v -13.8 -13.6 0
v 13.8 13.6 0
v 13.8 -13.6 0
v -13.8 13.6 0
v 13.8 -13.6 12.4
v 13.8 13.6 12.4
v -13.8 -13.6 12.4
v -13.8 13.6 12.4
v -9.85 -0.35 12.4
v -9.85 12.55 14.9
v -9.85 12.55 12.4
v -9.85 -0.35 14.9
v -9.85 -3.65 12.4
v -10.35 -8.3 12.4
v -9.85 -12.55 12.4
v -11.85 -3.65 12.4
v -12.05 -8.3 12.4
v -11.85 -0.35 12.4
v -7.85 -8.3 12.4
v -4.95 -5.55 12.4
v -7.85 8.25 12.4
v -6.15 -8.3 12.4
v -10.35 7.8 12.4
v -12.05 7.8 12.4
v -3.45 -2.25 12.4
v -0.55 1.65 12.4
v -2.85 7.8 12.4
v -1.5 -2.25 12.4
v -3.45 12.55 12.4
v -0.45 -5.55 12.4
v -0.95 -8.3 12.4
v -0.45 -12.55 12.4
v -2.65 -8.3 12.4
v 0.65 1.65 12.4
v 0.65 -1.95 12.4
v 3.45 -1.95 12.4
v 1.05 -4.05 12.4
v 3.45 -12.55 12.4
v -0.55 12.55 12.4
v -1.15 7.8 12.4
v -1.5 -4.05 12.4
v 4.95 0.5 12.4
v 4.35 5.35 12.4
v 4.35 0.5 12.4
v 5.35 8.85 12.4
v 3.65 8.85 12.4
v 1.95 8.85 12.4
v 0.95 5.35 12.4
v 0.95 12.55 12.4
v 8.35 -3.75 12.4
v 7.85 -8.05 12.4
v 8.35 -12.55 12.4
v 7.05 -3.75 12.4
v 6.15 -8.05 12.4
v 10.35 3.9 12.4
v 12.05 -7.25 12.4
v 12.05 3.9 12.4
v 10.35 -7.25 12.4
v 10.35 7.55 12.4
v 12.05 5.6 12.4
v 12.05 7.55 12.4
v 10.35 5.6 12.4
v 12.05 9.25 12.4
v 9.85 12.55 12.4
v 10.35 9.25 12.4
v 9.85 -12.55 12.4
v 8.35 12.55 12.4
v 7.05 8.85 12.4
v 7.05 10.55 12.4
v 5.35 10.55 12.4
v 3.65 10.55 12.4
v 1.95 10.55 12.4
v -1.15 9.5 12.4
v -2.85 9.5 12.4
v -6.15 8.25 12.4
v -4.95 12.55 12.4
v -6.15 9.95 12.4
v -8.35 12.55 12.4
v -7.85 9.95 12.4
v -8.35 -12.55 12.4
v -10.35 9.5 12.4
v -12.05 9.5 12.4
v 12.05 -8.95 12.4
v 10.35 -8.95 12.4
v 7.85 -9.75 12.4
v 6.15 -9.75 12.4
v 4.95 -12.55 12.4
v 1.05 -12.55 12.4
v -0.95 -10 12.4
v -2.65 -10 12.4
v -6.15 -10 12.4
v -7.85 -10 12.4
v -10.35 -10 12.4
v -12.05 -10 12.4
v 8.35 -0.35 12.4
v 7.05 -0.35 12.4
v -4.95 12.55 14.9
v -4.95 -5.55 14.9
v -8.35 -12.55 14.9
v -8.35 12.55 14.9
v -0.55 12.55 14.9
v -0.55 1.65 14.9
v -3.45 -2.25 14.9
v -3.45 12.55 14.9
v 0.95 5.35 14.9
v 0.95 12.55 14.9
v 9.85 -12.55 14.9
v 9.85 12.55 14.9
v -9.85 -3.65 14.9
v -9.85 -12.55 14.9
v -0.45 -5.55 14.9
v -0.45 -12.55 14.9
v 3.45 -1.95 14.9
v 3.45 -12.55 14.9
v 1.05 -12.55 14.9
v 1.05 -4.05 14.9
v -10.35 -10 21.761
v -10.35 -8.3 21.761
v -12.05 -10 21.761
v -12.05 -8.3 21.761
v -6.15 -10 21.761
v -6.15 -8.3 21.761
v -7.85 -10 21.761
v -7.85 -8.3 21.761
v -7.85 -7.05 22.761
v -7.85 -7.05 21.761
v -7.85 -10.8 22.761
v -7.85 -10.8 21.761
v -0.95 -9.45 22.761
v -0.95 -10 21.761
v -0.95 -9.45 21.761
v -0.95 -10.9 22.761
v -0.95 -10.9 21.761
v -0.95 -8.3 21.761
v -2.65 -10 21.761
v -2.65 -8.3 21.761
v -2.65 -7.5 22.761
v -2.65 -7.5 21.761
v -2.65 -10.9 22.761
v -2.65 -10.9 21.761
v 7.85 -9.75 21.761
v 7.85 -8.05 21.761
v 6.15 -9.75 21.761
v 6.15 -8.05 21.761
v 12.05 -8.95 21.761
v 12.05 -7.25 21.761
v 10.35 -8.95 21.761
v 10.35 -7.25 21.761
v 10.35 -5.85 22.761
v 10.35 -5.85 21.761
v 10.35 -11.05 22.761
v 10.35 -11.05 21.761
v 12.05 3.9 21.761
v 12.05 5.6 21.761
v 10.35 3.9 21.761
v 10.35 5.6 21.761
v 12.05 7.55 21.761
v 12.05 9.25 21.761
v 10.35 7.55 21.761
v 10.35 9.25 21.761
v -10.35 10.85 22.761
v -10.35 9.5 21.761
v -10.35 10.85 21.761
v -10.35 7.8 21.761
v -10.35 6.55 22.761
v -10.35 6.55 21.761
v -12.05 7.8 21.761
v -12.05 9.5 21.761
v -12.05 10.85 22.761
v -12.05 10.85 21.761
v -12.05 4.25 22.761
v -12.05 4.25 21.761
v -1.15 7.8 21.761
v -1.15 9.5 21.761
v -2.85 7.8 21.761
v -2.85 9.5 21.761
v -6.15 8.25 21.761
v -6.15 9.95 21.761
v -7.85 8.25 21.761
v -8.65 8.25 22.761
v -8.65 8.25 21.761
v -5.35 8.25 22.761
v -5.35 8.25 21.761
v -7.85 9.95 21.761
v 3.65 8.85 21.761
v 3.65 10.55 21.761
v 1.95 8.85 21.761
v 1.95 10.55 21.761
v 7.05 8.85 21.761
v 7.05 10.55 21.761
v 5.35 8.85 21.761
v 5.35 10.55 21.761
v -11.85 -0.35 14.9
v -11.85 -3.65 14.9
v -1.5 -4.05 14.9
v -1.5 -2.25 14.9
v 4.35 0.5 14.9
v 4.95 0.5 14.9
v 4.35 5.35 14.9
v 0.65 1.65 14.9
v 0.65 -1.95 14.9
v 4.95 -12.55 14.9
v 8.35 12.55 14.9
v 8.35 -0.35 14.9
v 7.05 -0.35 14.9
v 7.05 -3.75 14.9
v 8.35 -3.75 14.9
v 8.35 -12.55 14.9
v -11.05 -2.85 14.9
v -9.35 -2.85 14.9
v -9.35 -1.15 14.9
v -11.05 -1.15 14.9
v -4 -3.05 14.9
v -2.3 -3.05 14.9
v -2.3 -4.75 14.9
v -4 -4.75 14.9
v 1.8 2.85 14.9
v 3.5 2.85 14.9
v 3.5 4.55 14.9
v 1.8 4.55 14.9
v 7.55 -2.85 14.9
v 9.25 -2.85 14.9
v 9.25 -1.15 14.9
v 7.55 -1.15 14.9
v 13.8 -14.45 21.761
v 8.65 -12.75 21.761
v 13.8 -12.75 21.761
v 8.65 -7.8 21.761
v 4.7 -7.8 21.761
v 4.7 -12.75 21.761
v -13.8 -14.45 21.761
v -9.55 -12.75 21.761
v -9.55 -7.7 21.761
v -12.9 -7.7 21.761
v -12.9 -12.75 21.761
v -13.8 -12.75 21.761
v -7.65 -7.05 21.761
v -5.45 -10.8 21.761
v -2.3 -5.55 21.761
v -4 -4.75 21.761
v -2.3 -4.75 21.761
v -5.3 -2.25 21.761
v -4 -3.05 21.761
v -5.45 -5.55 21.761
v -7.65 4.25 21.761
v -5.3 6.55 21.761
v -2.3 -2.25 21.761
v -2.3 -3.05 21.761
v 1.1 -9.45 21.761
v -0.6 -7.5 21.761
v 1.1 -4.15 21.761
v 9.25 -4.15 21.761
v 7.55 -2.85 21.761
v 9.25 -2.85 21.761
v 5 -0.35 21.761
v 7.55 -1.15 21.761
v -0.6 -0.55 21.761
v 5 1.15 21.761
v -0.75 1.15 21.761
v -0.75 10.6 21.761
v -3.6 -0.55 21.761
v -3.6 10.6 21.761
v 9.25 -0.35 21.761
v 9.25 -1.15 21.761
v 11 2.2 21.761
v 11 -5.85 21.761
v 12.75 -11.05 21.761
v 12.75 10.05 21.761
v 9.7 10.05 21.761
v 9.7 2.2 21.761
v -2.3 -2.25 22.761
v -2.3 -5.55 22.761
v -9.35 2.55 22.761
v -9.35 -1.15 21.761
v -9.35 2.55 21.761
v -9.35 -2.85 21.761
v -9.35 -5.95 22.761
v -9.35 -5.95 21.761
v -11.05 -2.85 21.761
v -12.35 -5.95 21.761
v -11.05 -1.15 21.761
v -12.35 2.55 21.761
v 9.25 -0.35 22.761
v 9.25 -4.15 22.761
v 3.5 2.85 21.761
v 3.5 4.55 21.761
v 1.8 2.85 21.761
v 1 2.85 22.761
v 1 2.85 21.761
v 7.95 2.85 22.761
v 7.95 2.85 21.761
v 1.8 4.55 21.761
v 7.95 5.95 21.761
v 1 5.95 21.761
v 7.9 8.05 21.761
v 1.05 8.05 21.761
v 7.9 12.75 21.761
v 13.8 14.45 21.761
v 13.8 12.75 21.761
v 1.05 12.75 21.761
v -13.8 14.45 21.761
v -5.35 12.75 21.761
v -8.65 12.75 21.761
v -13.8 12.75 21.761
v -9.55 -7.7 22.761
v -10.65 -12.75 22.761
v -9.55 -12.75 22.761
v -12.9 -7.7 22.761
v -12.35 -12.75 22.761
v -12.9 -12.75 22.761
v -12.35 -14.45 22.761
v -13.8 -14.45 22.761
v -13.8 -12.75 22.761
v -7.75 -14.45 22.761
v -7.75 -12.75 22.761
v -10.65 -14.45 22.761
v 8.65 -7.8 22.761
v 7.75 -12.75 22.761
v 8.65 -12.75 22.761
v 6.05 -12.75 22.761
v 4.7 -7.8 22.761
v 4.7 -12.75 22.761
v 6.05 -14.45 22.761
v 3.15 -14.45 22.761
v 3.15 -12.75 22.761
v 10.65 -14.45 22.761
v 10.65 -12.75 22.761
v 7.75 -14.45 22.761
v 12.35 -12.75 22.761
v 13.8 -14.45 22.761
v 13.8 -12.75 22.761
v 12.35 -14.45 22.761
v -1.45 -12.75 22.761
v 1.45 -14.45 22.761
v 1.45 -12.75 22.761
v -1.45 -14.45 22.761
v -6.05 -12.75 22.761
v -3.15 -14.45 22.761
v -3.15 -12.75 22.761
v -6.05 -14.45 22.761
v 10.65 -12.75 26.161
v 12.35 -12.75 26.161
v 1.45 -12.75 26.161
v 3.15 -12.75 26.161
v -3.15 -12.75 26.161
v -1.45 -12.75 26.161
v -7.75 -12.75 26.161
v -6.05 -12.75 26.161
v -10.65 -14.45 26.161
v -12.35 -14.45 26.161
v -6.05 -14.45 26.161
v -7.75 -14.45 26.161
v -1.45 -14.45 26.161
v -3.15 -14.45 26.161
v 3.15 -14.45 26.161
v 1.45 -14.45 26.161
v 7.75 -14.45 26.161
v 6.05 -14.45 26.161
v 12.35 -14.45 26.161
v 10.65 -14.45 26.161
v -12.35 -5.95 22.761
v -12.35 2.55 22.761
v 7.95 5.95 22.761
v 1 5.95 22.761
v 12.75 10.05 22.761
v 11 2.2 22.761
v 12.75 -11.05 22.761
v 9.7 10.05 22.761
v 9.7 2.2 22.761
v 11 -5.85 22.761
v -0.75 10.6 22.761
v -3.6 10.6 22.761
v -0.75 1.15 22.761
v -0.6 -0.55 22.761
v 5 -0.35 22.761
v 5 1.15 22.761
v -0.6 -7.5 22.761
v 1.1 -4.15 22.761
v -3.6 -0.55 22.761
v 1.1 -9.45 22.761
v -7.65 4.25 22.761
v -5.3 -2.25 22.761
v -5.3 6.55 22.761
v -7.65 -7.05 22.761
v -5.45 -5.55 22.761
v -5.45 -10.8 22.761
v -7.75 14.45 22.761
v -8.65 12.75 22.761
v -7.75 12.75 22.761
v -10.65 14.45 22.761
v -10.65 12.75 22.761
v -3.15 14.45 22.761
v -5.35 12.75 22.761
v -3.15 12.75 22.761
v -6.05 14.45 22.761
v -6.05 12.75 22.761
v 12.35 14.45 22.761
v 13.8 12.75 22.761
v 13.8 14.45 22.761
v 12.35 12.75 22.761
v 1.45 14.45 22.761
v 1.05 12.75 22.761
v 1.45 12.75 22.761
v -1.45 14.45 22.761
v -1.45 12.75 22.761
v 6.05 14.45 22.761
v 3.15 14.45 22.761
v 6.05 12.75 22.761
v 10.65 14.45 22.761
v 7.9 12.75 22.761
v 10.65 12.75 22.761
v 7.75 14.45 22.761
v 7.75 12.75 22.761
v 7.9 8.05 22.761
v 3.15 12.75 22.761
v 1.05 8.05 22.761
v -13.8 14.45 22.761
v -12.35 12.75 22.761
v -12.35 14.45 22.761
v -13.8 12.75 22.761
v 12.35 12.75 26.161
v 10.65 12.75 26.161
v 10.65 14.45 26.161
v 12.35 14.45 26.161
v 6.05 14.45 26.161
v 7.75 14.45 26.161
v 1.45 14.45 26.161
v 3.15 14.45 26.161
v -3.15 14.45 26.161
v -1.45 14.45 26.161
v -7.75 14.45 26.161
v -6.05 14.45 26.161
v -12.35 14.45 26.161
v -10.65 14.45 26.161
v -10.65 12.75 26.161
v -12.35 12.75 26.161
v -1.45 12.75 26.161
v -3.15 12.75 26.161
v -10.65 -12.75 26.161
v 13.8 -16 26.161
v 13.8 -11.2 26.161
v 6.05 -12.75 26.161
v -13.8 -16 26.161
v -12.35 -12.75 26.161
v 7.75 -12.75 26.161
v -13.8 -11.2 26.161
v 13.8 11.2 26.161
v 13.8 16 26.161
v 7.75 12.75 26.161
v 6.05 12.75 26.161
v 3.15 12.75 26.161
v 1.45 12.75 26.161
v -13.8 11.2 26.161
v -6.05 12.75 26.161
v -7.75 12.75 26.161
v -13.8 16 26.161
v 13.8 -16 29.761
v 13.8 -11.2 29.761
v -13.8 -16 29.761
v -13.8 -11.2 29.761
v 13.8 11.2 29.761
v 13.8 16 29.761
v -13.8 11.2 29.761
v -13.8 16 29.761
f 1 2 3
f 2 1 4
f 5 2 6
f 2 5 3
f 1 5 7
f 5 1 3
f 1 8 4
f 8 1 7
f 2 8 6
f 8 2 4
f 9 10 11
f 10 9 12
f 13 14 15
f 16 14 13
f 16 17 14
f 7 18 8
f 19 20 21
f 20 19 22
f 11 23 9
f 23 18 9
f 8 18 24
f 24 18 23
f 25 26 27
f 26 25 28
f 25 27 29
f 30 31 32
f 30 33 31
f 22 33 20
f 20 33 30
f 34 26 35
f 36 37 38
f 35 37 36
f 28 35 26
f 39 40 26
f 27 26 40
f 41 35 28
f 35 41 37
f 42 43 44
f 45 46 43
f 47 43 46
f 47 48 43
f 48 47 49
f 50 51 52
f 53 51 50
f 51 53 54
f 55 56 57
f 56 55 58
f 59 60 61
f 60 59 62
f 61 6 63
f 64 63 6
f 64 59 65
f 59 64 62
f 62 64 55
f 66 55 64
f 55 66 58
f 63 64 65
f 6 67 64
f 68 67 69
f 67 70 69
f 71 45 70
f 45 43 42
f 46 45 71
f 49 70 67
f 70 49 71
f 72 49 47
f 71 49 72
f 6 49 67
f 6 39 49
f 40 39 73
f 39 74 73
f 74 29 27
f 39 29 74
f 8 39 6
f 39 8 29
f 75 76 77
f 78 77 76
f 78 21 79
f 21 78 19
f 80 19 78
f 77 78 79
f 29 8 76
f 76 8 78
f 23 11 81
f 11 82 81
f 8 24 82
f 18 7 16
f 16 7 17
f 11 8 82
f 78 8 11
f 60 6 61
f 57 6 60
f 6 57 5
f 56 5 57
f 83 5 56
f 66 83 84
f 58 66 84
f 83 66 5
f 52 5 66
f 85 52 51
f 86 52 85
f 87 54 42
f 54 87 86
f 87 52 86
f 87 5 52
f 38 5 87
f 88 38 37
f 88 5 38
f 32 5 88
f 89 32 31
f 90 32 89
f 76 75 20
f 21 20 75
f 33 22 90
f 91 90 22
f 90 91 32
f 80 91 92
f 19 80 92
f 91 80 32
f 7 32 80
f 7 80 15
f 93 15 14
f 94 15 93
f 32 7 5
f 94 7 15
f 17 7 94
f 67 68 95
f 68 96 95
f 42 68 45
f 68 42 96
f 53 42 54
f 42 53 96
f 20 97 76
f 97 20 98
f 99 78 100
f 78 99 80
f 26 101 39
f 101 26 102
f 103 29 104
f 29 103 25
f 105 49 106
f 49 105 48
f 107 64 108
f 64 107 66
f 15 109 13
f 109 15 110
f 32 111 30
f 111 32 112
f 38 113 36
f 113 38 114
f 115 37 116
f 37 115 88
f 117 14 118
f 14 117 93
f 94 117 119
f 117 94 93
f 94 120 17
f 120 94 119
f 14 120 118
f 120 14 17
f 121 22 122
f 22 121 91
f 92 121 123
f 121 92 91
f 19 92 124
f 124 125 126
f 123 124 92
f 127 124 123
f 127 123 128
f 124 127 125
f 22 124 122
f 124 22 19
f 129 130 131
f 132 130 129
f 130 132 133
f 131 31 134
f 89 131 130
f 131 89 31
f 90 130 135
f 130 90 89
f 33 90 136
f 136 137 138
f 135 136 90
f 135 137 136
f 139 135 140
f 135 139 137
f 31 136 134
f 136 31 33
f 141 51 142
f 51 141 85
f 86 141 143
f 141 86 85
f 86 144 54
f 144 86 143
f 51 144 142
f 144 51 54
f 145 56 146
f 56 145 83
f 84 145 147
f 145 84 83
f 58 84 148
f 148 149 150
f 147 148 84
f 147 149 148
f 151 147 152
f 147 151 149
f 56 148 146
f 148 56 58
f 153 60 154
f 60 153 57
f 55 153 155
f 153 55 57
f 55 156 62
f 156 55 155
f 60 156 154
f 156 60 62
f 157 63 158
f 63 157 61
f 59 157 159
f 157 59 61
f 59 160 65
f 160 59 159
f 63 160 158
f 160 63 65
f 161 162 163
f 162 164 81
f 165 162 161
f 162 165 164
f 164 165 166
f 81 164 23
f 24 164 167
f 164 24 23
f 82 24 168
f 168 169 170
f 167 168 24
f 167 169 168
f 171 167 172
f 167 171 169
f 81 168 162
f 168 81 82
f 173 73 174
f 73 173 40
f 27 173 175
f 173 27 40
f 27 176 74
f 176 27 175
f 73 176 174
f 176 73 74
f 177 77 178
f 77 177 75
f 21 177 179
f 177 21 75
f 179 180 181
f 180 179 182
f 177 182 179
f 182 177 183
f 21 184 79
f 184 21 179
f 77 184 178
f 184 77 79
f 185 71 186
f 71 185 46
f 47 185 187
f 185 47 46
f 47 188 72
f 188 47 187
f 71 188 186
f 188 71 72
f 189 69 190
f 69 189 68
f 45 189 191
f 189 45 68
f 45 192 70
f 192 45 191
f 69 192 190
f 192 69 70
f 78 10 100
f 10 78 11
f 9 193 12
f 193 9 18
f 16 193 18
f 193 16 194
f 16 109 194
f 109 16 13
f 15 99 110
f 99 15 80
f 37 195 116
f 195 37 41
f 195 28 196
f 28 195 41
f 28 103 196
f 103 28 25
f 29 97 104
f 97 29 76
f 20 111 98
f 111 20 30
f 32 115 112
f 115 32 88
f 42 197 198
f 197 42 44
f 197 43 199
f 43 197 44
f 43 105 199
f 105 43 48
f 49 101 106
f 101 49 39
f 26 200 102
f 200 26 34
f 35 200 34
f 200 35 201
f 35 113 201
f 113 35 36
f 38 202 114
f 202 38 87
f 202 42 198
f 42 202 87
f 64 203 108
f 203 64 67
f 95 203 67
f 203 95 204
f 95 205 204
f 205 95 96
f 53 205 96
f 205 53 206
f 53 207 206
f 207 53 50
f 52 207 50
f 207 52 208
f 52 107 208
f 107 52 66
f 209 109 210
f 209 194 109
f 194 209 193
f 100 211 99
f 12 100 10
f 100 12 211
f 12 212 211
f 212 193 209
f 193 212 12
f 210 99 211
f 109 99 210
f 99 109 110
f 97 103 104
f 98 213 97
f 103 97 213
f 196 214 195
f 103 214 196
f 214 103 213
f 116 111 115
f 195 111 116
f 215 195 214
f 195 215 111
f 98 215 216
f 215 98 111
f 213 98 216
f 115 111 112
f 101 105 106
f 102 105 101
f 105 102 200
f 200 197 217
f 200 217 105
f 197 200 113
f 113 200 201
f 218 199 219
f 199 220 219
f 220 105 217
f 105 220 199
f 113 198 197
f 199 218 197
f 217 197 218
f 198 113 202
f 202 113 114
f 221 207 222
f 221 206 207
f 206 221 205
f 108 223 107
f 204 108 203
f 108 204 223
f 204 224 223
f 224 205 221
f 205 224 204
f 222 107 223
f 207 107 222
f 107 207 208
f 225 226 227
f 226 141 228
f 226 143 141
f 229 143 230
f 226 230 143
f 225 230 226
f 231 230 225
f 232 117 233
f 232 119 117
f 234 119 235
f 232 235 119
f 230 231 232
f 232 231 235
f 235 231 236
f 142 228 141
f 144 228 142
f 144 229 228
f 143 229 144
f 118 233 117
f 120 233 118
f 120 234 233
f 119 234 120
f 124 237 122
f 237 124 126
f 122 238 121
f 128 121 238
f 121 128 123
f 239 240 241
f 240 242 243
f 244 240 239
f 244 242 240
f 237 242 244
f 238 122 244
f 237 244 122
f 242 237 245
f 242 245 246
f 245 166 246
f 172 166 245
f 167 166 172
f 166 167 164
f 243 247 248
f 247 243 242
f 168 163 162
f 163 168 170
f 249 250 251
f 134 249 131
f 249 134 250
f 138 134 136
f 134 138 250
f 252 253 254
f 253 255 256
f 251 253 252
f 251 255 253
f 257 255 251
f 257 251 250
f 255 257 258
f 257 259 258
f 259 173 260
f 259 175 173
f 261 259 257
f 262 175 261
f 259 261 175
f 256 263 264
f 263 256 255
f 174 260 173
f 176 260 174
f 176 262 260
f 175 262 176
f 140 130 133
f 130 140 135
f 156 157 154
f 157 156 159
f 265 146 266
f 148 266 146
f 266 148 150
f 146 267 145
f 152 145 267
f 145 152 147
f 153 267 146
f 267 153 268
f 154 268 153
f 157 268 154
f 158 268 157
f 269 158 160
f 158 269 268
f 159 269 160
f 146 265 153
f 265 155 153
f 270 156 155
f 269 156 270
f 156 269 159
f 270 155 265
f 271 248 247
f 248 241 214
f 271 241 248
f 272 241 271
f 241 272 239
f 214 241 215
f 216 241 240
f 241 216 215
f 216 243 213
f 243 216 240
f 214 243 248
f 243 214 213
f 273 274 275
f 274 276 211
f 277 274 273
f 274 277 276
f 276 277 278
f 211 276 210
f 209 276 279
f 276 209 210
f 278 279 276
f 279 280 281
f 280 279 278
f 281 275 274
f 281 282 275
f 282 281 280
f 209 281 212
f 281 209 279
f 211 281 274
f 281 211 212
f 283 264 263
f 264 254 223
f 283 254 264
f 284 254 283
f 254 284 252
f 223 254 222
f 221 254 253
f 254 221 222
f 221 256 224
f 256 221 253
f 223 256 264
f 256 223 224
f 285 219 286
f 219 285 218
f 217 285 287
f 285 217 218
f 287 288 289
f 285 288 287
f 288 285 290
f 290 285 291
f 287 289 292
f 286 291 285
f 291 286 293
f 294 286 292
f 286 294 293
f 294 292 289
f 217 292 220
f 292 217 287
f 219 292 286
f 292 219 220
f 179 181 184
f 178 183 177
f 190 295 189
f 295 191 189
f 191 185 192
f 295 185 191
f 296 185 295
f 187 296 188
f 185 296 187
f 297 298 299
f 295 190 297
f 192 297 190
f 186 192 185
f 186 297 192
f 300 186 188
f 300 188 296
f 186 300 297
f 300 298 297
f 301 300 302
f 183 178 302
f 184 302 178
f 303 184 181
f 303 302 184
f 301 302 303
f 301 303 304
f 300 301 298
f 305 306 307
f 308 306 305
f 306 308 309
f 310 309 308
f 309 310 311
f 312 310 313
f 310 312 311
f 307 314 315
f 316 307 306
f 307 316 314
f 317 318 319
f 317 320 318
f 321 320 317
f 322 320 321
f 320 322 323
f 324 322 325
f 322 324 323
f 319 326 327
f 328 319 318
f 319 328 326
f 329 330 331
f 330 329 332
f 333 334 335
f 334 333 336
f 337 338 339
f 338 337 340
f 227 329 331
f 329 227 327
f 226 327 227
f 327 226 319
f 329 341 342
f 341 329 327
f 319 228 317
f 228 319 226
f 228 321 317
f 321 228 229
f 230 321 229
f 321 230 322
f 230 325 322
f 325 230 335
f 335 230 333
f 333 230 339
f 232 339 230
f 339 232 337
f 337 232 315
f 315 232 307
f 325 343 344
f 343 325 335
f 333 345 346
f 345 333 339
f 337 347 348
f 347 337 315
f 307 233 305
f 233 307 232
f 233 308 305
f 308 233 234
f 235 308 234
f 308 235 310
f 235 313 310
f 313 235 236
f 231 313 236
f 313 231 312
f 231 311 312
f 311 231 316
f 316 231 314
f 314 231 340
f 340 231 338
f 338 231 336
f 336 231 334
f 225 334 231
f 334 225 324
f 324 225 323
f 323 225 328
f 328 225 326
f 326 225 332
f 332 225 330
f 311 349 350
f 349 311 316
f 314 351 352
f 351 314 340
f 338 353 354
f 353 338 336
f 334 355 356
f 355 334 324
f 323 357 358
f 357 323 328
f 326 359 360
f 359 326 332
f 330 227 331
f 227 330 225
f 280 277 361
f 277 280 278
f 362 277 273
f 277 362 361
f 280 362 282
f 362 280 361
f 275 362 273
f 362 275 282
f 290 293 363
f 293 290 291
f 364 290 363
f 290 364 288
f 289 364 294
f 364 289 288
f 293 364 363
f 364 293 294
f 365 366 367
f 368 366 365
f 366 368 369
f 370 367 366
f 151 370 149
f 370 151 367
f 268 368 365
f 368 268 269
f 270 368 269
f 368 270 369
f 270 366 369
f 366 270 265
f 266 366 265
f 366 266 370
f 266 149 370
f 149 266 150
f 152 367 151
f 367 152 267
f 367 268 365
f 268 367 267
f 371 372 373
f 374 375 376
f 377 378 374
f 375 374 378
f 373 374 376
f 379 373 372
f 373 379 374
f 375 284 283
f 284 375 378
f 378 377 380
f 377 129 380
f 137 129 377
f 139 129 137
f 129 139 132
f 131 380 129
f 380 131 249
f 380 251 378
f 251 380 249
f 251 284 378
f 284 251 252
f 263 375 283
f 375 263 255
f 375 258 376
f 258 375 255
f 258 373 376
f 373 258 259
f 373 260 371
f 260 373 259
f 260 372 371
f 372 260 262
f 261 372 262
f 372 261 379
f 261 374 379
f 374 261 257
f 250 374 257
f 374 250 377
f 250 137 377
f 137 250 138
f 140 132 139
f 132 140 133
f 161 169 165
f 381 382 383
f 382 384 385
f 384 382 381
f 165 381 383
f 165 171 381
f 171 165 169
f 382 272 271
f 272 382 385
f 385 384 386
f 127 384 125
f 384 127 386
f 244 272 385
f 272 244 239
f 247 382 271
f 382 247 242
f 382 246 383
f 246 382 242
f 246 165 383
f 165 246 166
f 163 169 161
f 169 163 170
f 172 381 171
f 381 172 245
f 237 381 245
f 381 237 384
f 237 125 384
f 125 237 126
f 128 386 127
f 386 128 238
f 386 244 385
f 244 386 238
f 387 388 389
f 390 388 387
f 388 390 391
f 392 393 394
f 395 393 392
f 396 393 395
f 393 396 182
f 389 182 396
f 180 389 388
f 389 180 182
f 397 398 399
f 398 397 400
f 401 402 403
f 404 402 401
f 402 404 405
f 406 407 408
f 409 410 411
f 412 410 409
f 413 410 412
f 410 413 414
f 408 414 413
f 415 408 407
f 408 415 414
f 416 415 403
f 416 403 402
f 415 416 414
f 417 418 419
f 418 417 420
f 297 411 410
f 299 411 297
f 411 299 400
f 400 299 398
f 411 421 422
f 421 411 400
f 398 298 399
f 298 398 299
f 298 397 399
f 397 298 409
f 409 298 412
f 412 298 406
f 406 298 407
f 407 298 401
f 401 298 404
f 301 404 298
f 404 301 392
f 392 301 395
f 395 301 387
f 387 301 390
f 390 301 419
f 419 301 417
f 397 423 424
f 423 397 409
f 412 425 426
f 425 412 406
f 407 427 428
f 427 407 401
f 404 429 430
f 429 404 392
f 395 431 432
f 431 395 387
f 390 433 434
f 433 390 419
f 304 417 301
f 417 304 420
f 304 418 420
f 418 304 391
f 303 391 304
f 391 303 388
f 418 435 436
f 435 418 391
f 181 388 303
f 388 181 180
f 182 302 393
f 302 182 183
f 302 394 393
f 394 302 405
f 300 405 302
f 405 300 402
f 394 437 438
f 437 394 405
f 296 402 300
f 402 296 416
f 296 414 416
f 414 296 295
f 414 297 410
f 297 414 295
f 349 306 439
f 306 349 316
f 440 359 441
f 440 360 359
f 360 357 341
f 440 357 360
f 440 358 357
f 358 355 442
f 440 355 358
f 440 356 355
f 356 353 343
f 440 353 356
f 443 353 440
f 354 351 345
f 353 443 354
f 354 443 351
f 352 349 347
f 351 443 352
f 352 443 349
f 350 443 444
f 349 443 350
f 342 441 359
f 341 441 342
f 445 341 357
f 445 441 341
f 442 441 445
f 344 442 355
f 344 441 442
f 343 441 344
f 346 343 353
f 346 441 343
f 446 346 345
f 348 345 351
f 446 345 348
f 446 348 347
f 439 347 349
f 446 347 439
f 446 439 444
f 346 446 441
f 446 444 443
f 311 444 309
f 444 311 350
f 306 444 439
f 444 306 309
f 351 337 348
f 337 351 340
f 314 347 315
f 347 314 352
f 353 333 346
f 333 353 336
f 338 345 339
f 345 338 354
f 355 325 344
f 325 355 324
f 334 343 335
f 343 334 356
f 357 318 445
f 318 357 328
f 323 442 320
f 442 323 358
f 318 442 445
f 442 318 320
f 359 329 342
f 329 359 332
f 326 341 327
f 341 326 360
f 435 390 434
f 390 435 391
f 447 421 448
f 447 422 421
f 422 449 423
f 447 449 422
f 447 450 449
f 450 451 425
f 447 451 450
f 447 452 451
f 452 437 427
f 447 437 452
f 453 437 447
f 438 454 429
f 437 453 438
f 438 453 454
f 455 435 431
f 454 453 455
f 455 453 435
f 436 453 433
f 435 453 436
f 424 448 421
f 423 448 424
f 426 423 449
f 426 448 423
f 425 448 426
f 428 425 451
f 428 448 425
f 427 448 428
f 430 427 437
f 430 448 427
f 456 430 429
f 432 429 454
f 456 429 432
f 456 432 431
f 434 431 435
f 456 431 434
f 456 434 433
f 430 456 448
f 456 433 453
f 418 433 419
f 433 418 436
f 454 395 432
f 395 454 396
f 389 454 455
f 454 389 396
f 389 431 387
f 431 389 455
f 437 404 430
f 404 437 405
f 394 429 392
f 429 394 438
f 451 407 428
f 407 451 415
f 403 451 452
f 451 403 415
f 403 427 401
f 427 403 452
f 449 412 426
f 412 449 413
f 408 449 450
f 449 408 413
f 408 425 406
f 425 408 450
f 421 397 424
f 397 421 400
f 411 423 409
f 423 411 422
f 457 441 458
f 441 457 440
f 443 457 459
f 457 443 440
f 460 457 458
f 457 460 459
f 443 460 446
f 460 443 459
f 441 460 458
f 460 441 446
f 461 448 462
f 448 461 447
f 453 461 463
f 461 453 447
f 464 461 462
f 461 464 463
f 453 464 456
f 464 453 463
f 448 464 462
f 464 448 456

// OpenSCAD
// Generated by SolidPython 0.4.2 on 2020-09-29 23:20:03
//!OpenSCAD

scale(v = 0.0100000000) {
	translate(v = [-1380, -1360, 0]) {
		union() {
			color(c = [0.4000000000, 0.4000000000, 0.4000000000]) {
				translate(v = [0, 0, 0]) {
					linear_extrude(height = 1000.0000000000) {
						polygon(paths = [[0, 1, 2, 3]], points = [[0, 0], [0, 2720], [2760, 2720], [2760, 0]]);
					}
				}
			}
			color(c = [0.2000000000, 0.6000000000, 0.2000000000]) {
				translate(v = [0, 0, 1000.0000000000]) {
					linear_extrude(height = 120.0000000000) {
						polygon(paths = [[0, 1, 2, 3]], points = [[0, 1305], [0, 2720], [2760, 2720], [2760, 1305]]);
					}
				}
			}
			color(c = [0.4000000000, 0.4000000000, 0.4000000000]) {
				translate(v = [0, 0, 1000.0000000000]) {
					linear_extrude(height = 120.0000000000) {
						polygon(paths = [[0, 1, 2, 3]], points = [[0, 0], [0, 1305], [2760, 1305], [2760, 0]]);
					}
				}
			}
			color(c = [0.9000000000, 0.6000000000, 0.6000000000]) {
				translate(v = [0, 0, 1120.0000000000]) {
					linear_extrude(height = 120.0000000000) {
						polygon(paths = [[0, 1, 2, 3]], points = [[135, 2065], [135, 2485], [395, 2485], [395, 2065]]);
					}
				}
			}
			color(c = [0.9000000000, 0.6000000000, 0.6000000000]) {
				translate(v = [0, 0, 1120.0000000000]) {
					linear_extrude(height = 120.0000000000) {
						polygon(paths = [[0, 1, 2, 3]], points = [[545, 2065], [545, 2485], [885, 2485], [885, 2065]]);
					}
				}
			}
			color(c = [0.9000000000, 0.6000000000, 0.6000000000]) {
				translate(v = [0, 0, 1120.0000000000]) {
					linear_extrude(height = 120.0000000000) {
						polygon(paths = [[0, 1, 2, 3]], points = [[1035, 2065], [1035, 2485], [1325, 2485], [1325, 2065]]);
					}
				}
			}
			color(c = [0.9000000000, 0.6000000000, 0.6000000000]) {
				translate(v = [0, 0, 1120.0000000000]) {
					linear_extrude(height = 120.0000000000) {
						polygon(paths = [[0, 1, 2, 3, 4, 5]], points = [[1965, 1485], [1965, 2065], [1475, 2065], [1475, 2485], [2215, 2485], [2215, 1485]]);
					}
				}
			}
			color(c = [0.9000000000, 0.6000000000, 0.6000000000]) {
				translate(v = [0, 0, 1120.0000000000]) {
					linear_extrude(height = 120.0000000000) {
						polygon(paths = [[0, 1, 2, 3]], points = [[2365, 1485], [2365, 2485], [2625, 2485], [2625, 1485]]);
					}
				}
			}
			color(c = [0.9000000000, 0.6000000000, 0.9000000000]) {
				translate(v = [0, 0, 1120.0000000000]) {
					linear_extrude(height = 120.0000000000) {
						polygon(paths = [[0, 1, 2, 3]], points = [[135, 235], [135, 655], [395, 655], [395, 235]]);
					}
				}
			}
			color(c = [0.9000000000, 0.6000000000, 0.9000000000]) {
				translate(v = [0, 0, 1120.0000000000]) {
					linear_extrude(height = 120.0000000000) {
						polygon(paths = [[0, 1, 2, 3]], points = [[545, 235], [545, 655], [805, 655], [805, 235]]);
					}
				}
			}
			color(c = [0.9000000000, 0.6000000000, 0.9000000000]) {
				translate(v = [0, 0, 1120.0000000000]) {
					linear_extrude(height = 120.0000000000) {
						polygon(paths = [[0, 1, 2, 3]], points = [[1075, 235], [1075, 655], [1335, 655], [1335, 235]]);
					}
				}
			}
			color(c = [0.9000000000, 0.6000000000, 0.9000000000]) {
				translate(v = [0, 0, 1120.0000000000]) {
					linear_extrude(height = 120.0000000000) {
						polygon(paths = [[0, 1, 2, 3]], points = [[1485, 235], [1485, 655], [1725, 655], [1725, 235]]);
					}
				}
			}
			color(c = [0.9000000000, 0.6000000000, 0.9000000000]) {
				translate(v = [0, 0, 1120.0000000000]) {
					linear_extrude(height = 120.0000000000) {
						polygon(paths = [[0, 1, 2, 3, 4, 5]], points = [[1875, 235], [1875, 655], [1955, 655], [1955, 885], [2215, 885], [2215, 235]]);
					}
				}
			}
			color(c = [0.9000000000, 0.6000000000, 0.9000000000]) {
				translate(v = [0, 0, 1120.0000000000]) {
					linear_extrude(height = 120.0000000000) {
						polygon(paths = [[0, 1, 2, 3]], points = [[2365, 235], [2365, 885], [2625, 885], [2625, 235]]);
					}
				}
			}
			color(c = [0.2000000000, 0.6000000000, 0.2000000000]) {
				translate(v = [0, 0, 1120.0000000000]) {
					linear_extrude(height = 120.0000000000) {
						difference() {
							polygon(paths = [[0, 1, 2, 3]], points = [[0, 1305], [0, 2720], [2760, 2720], [2760, 1305]]);
							polygon(paths = [[0, 1, 2, 3]], points = [[2365, 1485], [2625, 1485], [2625, 2485], [2365, 2485]]);
							polygon(paths = [[0, 1, 2, 3]], points = [[135, 2065], [395, 2065], [395, 2485], [135, 2485]]);
							polygon(paths = [[0, 1, 2, 3]], points = [[545, 2065], [885, 2065], [885, 2485], [545, 2485]]);
							polygon(paths = [[0, 1, 2, 3]], points = [[1035, 2065], [1325, 2065], [1325, 2485], [1035, 2485]]);
							polygon(paths = [[0, 1, 2, 3, 4, 5]], points = [[1965, 1485], [2215, 1485], [2215, 2485], [1475, 2485], [1475, 2065], [1965, 2065]]);
						}
					}
				}
			}
			color(c = [0.4000000000, 0.4000000000, 0.4000000000]) {
				translate(v = [0, 0, 1120.0000000000]) {
					linear_extrude(height = 120.0000000000) {
						difference() {
							polygon(paths = [[0, 1, 2, 3]], points = [[0, 0], [0, 1305], [2760, 1305], [2760, 0]]);
							polygon(paths = [[0, 1, 2, 3]], points = [[135, 235], [395, 235], [395, 655], [135, 655]]);
							polygon(paths = [[0, 1, 2, 3]], points = [[545, 235], [805, 235], [805, 655], [545, 655]]);
							polygon(paths = [[0, 1, 2, 3]], points = [[1075, 235], [1335, 235], [1335, 655], [1075, 655]]);
							polygon(paths = [[0, 1, 2, 3]], points = [[1485, 235], [1725, 235], [1725, 655], [1485, 655]]);
							polygon(paths = [[0, 1, 2, 3]], points = [[2365, 235], [2625, 235], [2625, 885], [2365, 885]]);
							polygon(paths = [[0, 1, 2, 3, 4, 5]], points = [[1875, 235], [2215, 235], [2215, 885], [1955, 885], [1955, 655], [1875, 655]]);
						}
					}
				}
			}
			color(c = [0.1000000000, 0.1000000000, 0.1000000000]) {
				translate(v = [0, 0, 1240.0000000000]) {
					linear_extrude(height = 70.0000000000) {
						polygon(paths = [[0, 1, 2, 3]], points = [[175, 360], [175, 530], [345, 530], [345, 360]]);
					}
				}
			}
			color(c = [0.1000000000, 0.1000000000, 0.1000000000]) {
				translate(v = [0, 0, 1240.0000000000]) {
					linear_extrude(height = 70.0000000000) {
						polygon(paths = [[0, 1, 2, 3]], points = [[595, 360], [595, 530], [765, 530], [765, 360]]);
					}
				}
			}
			color(c = [0.1000000000, 0.1000000000, 0.1000000000]) {
				translate(v = [0, 0, 1240.0000000000]) {
					linear_extrude(height = 70.0000000000) {
						polygon(paths = [[0, 1, 2, 3]], points = [[1115, 360], [1115, 530], [1285, 530], [1285, 360]]);
					}
				}
			}
			color(c = [0.1000000000, 0.1000000000, 0.1000000000]) {
				translate(v = [0, 0, 1240.0000000000]) {
					linear_extrude(height = 70.0000000000) {
						polygon(paths = [[0, 1, 2, 3]], points = [[1995, 385], [1995, 555], [2165, 555], [2165, 385]]);
					}
				}
			}
			color(c = [0.1000000000, 0.1000000000, 0.1000000000]) {
				translate(v = [0, 0, 1240.0000000000]) {
					linear_extrude(height = 70.0000000000) {
						polygon(paths = [[0, 1, 2, 3]], points = [[2415, 465], [2415, 635], [2585, 635], [2585, 465]]);
					}
				}
			}
			color(c = [0.1000000000, 0.1000000000, 0.1000000000]) {
				translate(v = [0, 0, 1240.0000000000]) {
					linear_extrude(height = 70.0000000000) {
						polygon(paths = [[0, 1, 2, 3]], points = [[2415, 1750], [2415, 1920], [2585, 1920], [2585, 1750]]);
					}
				}
			}
			color(c = [0.1000000000, 0.1000000000, 0.1000000000]) {
				translate(v = [0, 0, 1240.0000000000]) {
					linear_extrude(height = 70.0000000000) {
						polygon(paths = [[0, 1, 2, 3]], points = [[2415, 2115], [2415, 2285], [2585, 2285], [2585, 2115]]);
					}
				}
			}
			color(c = [0.1000000000, 0.1000000000, 0.1000000000]) {
				translate(v = [0, 0, 1240.0000000000]) {
					linear_extrude(height = 70.0000000000) {
						polygon(paths = [[0, 1, 2, 3]], points = [[175, 2140], [175, 2310], [345, 2310], [345, 2140]]);
					}
				}
			}
			color(c = [0.1000000000, 0.1000000000, 0.1000000000]) {
				translate(v = [0, 0, 1240.0000000000]) {
					linear_extrude(height = 70.0000000000) {
						polygon(paths = [[0, 1, 2, 3]], points = [[1095, 2140], [1095, 2310], [1265, 2310], [1265, 2140]]);
					}
				}
			}
			color(c = [0.1000000000, 0.1000000000, 0.1000000000]) {
				translate(v = [0, 0, 1240.0000000000]) {
					linear_extrude(height = 70.0000000000) {
						polygon(paths = [[0, 1, 2, 3]], points = [[595, 2185], [595, 2355], [765, 2355], [765, 2185]]);
					}
				}
			}
			color(c = [0.1000000000, 0.1000000000, 0.1000000000]) {
				translate(v = [0, 0, 1240.0000000000]) {
					linear_extrude(height = 70.0000000000) {
						polygon(paths = [[0, 1, 2, 3]], points = [[1575, 2245], [1575, 2415], [1745, 2415], [1745, 2245]]);
					}
				}
			}
			color(c = [0.1000000000, 0.1000000000, 0.1000000000]) {
				translate(v = [0, 0, 1240.0000000000]) {
					linear_extrude(height = 70.0000000000) {
						polygon(paths = [[0, 1, 2, 3]], points = [[1915, 2245], [1915, 2415], [2085, 2415], [2085, 2245]]);
					}
				}
			}
			color(c = [1.0000000000, 1.0000000000, 1.0000000000]) {
				translate(v = [0, 0, 1240.0000000000]) {
					linear_extrude(height = 70.0000000000) {
						polygon(paths = [[0, 1, 2, 3, 4, 5, 6, 7]], points = [[395, 105], [395, 995], [195, 995], [195, 1325], [395, 1325], [395, 2615], [545, 2615], [545, 105]]);
					}
				}
			}
			color(c = [1.0000000000, 1.0000000000, 1.0000000000]) {
				translate(v = [0, 0, 1240.0000000000]) {
					linear_extrude(height = 70.0000000000) {
						polygon(paths = [[0, 1, 2, 3, 4, 5, 6, 7, 8, 9]], points = [[1335, 105], [1335, 805], [885, 805], [885, 2615], [1035, 2615], [1035, 1135], [1230, 1135], [1230, 955], [1485, 955], [1485, 105]]);
					}
				}
			}
			color(c = [1.0000000000, 1.0000000000, 1.0000000000]) {
				translate(v = [0, 0, 1240.0000000000]) {
					linear_extrude(height = 70.0000000000) {
						polygon(paths = [[0, 1, 2, 3, 4, 5, 6, 7, 8, 9, 10, 11]], points = [[1725, 105], [1725, 1165], [1445, 1165], [1445, 1525], [1325, 1525], [1325, 2615], [1475, 2615], [1475, 1895], [1815, 1895], [1815, 1410], [1875, 1410], [1875, 105]]);
					}
				}
			}
			color(c = [1.0000000000, 1.0000000000, 1.0000000000]) {
				translate(v = [0, 0, 1240.0000000000]) {
					linear_extrude(height = 70.0000000000) {
						polygon(paths = [[0, 1, 2, 3, 4, 5, 6, 7]], points = [[2215, 105], [2215, 985], [2085, 985], [2085, 1325], [2215, 1325], [2215, 2615], [2365, 2615], [2365, 105]]);
					}
				}
			}
			color(c = [0.1000000000, 0.1000000000, 0.1000000000]) {
				translate(v = [0, 0, 1310.0000000000]) {
					linear_extrude(height = 180.0000000000) {
						polygon(paths = [[0, 1, 2, 3]], points = [[175, 360], [175, 530], [345, 530], [345, 360]]);
					}
				}
			}
			color(c = [0.1000000000, 0.1000000000, 0.1000000000]) {
				translate(v = [0, 0, 1310.0000000000]) {
					linear_extrude(height = 180.0000000000) {
						polygon(paths = [[0, 1, 2, 3]], points = [[595, 360], [595, 530], [765, 530], [765, 360]]);
					}
				}
			}
			color(c = [0.1000000000, 0.1000000000, 0.1000000000]) {
				translate(v = [0, 0, 1310.0000000000]) {
					linear_extrude(height = 180.0000000000) {
						polygon(paths = [[0, 1, 2, 3]], points = [[1115, 360], [1115, 530], [1285, 530], [1285, 360]]);
					}
				}
			}
			color(c = [0.1000000000, 0.1000000000, 0.1000000000]) {
				translate(v = [0, 0, 1310.0000000000]) {
					linear_extrude(height = 180.0000000000) {
						polygon(paths = [[0, 1, 2, 3]], points = [[1995, 385], [1995, 555], [2165, 555], [2165, 385]]);
					}
				}
			}
			color(c = [0.1000000000, 0.1000000000, 0.1000000000]) {
				translate(v = [0, 0, 1310.0000000000]) {
					linear_extrude(height = 180.0000000000) {
						polygon(paths = [[0, 1, 2, 3]], points = [[2415, 465], [2415, 635], [2585, 635], [2585, 465]]);
					}
				}
			}
			color(c = [0.1000000000, 0.1000000000, 0.1000000000]) {
				translate(v = [0, 0, 1310.0000000000]) {
					linear_extrude(height = 180.0000000000) {
						polygon(paths = [[0, 1, 2, 3]], points = [[2415, 1750], [2415, 1920], [2585, 1920], [2585, 1750]]);
					}
				}
			}
			color(c = [0.1000000000, 0.1000000000, 0.1000000000]) {
				translate(v = [0, 0, 1310.0000000000]) {
					linear_extrude(height = 180.0000000000) {
						polygon(paths = [[0, 1, 2, 3]], points = [[2415, 2115], [2415, 2285], [2585, 2285], [2585, 2115]]);
					}
				}
			}
			color(c = [0.1000000000, 0.1000000000, 0.1000000000]) {
				translate(v = [0, 0, 1310.0000000000]) {
					linear_extrude(height = 180.0000000000) {
						polygon(paths = [[0, 1, 2, 3]], points = [[175, 2140], [175, 2310], [345, 2310], [345, 2140]]);
					}
				}
			}
			color(c = [0.1000000000, 0.1000000000, 0.1000000000]) {
				translate(v = [0, 0, 1310.0000000000]) {
					linear_extrude(height = 180.0000000000) {
						polygon(paths = [[0, 1, 2, 3]], points = [[1095, 2140], [1095, 2310], [1265, 2310], [1265, 2140]]);
					}
				}
			}
			color(c = [0.1000000000, 0.1000000000, 0.1000000000]) {
				translate(v = [0, 0, 1310.0000000000]) {
					linear_extrude(height = 180.0000000000) {
						polygon(paths = [[0, 1, 2, 3]], points = [[595, 2185], [595, 2355], [765, 2355], [765, 2185]]);
					}
				}
			}
			color(c = [0.1000000000, 0.1000000000, 0.1000000000]) {
				translate(v = [0, 0, 1310.0000000000]) {
					linear_extrude(height = 180.0000000000) {
						polygon(paths = [[0, 1, 2, 3]], points = [[1575, 2245], [1575, 2415], [1745, 2415], [1745, 2245]]);
					}
				}
			}
			color(c = [0.1000000000, 0.1000000000, 0.1000000000]) {
				translate(v = [0, 0, 1310.0000000000]) {
					linear_extrude(height = 180.0000000000) {
						polygon(paths = [[0, 1, 2, 3]], points = [[1915, 2245], [1915, 2415], [2085, 2415], [2085, 2245]]);
					}
				}
			}
			color(c = [0.7000000000, 0, 0]) {
				translate(v = [0, 0, 1310.0000000000]) {
					linear_extrude(height = 180.0000000000) {
						polygon(paths = [[0, 1, 2, 3, 4, 5, 6, 7]], points = [[395, 105], [395, 995], [195, 995], [195, 1325], [395, 1325], [395, 2615], [545, 2615], [545, 105]]);
					}
				}
			}
			color(c = [0.7000000000, 0, 0]) {
				translate(v = [0, 0, 1310.0000000000]) {
					linear_extrude(height = 180.0000000000) {
						polygon(paths = [[0, 1, 2, 3, 4, 5, 6, 7, 8, 9]], points = [[1335, 105], [1335, 805], [885, 805], [885, 2615], [1035, 2615], [1035, 1135], [1230, 1135], [1230, 955], [1485, 955], [1485, 105]]);
					}
				}
			}
			color(c = [0.7000000000, 0, 0]) {
				translate(v = [0, 0, 1310.0000000000]) {
					linear_extrude(height = 180.0000000000) {
						polygon(paths = [[0, 1, 2, 3, 4, 5, 6, 7, 8, 9, 10, 11]], points = [[1725, 105], [1725, 1165], [1445, 1165], [1445, 1525], [1325, 1525], [1325, 2615], [1475, 2615], [1475, 1895], [1815, 1895], [1815, 1410], [1875, 1410], [1875, 105]]);
					}
				}
			}
			color(c = [0.7000000000, 0, 0]) {
				translate(v = [0, 0, 1310.0000000000]) {
					linear_extrude(height = 180.0000000000) {
						polygon(paths = [[0, 1, 2, 3, 4, 5, 6, 7]], points = [[2215, 105], [2215, 985], [2085, 985], [2085, 1325], [2215, 1325], [2215, 2615], [2365, 2615], [2365, 105]]);
					}
				}
			}
			color(c = [0.1000000000, 0.1000000000, 0.1000000000]) {
				translate(v = [0, 0, 1490.0000000000]) {
					linear_extrude(height = 686.1000000000) {
						polygon(paths = [[0, 1, 2, 3]], points = [[175, 360], [175, 530], [345, 530], [345, 360]]);
					}
				}
			}
			color(c = [0.1000000000, 0.1000000000, 0.1000000000]) {
				translate(v = [0, 0, 1490.0000000000]) {
					linear_extrude(height = 686.1000000000) {
						polygon(paths = [[0, 1, 2, 3]], points = [[595, 360], [595, 530], [765, 530], [765, 360]]);
					}
				}
			}
			color(c = [0.1000000000, 0.1000000000, 0.1000000000]) {
				translate(v = [0, 0, 1490.0000000000]) {
					linear_extrude(height = 686.1000000000) {
						polygon(paths = [[0, 1, 2, 3]], points = [[1115, 360], [1115, 530], [1285, 530], [1285, 360]]);
					}
				}
			}
			color(c = [0.1000000000, 0.1000000000, 0.1000000000]) {
				translate(v = [0, 0, 1490.0000000000]) {
					linear_extrude(height = 686.1000000000) {
						polygon(paths = [[0, 1, 2, 3]], points = [[1995, 385], [1995, 555], [2165, 555], [2165, 385]]);
					}
				}
			}
			color(c = [0.1000000000, 0.1000000000, 0.1000000000]) {
				translate(v = [0, 0, 1490.0000000000]) {
					linear_extrude(height = 686.1000000000) {
						polygon(paths = [[0, 1, 2, 3]], points = [[2415, 465], [2415, 635], [2585, 635], [2585, 465]]);
					}
				}
			}
			color(c = [0.1000000000, 0.1000000000, 0.1000000000]) {
				translate(v = [0, 0, 1490.0000000000]) {
					linear_extrude(height = 686.1000000000) {
						polygon(paths = [[0, 1, 2, 3]], points = [[980, 885], [980, 1055], [1150, 1055], [1150, 885]]);
					}
				}
			}
			color(c = [0.1000000000, 0.1000000000, 0.1000000000]) {
				translate(v = [0, 0, 1490.0000000000]) {
					linear_extrude(height = 686.1000000000) {
						polygon(paths = [[0, 1, 2, 3]], points = [[275, 1075], [275, 1245], [445, 1245], [445, 1075]]);
					}
				}
			}
			color(c = [0.1000000000, 0.1000000000, 0.1000000000]) {
				translate(v = [0, 0, 1490.0000000000]) {
					linear_extrude(height = 686.1000000000) {
						polygon(paths = [[0, 1, 2, 3]], points = [[2135, 1075], [2135, 1245], [2305, 1245], [2305, 1075]]);
					}
				}
			}
			color(c = [0.1000000000, 0.1000000000, 0.1000000000]) {
				translate(v = [0, 0, 1490.0000000000]) {
					linear_extrude(height = 686.1000000000) {
						polygon(paths = [[0, 1, 2, 3]], points = [[1560, 1645], [1560, 1815], [1730, 1815], [1730, 1645]]);
					}
				}
			}
			color(c = [0.1000000000, 0.1000000000, 0.1000000000]) {
				translate(v = [0, 0, 1490.0000000000]) {
					linear_extrude(height = 686.1000000000) {
						polygon(paths = [[0, 1, 2, 3]], points = [[2415, 1750], [2415, 1920], [2585, 1920], [2585, 1750]]);
					}
				}
			}
			color(c = [0.1000000000, 0.1000000000, 0.1000000000]) {
				translate(v = [0, 0, 1490.0000000000]) {
					linear_extrude(height = 686.1000000000) {
						polygon(paths = [[0, 1, 2, 3]], points = [[2415, 2115], [2415, 2285], [2585, 2285], [2585, 2115]]);
					}
				}
			}
			color(c = [0.1000000000, 0.1000000000, 0.1000000000]) {
				translate(v = [0, 0, 1490.0000000000]) {
					linear_extrude(height = 686.1000000000) {
						polygon(paths = [[0, 1, 2, 3]], points = [[175, 2140], [175, 2310], [345, 2310], [345, 2140]]);
					}
				}
			}
			color(c = [0.1000000000, 0.1000000000, 0.1000000000]) {
				translate(v = [0, 0, 1490.0000000000]) {
					linear_extrude(height = 686.1000000000) {
						polygon(paths = [[0, 1, 2, 3]], points = [[1095, 2140], [1095, 2310], [1265, 2310], [1265, 2140]]);
					}
				}
			}
			color(c = [0.1000000000, 0.1000000000, 0.1000000000]) {
				translate(v = [0, 0, 1490.0000000000]) {
					linear_extrude(height = 686.1000000000) {
						polygon(paths = [[0, 1, 2, 3]], points = [[595, 2185], [595, 2355], [765, 2355], [765, 2185]]);
					}
				}
			}
			color(c = [0.1000000000, 0.1000000000, 0.1000000000]) {
				translate(v = [0, 0, 1490.0000000000]) {
					linear_extrude(height = 686.1000000000) {
						polygon(paths = [[0, 1, 2, 3]], points = [[1575, 2245], [1575, 2415], [1745, 2415], [1745, 2245]]);
					}
				}
			}
			color(c = [0.1000000000, 0.1000000000, 0.1000000000]) {
				translate(v = [0, 0, 1490.0000000000]) {
					linear_extrude(height = 686.1000000000) {
						polygon(paths = [[0, 1, 2, 3]], points = [[1915, 2245], [1915, 2415], [2085, 2415], [2085, 2245]]);
					}
				}
			}
			color(c = [0.9000000000, 0.6000000000, 0.6000000000]) {
				translate(v = [0, 0, 2176.1000000000]) {
					linear_extrude(height = 100.0000000000) {
						polygon(paths = [[0, 1, 2, 3, 4, 5, 6, 7, 8, 9, 10, 11]], points = [[0, -85], [0, 85], [90, 85], [90, 590], [425, 590], [425, 85], [1850, 85], [1850, 580], [2245, 580], [2245, 85], [2760, 85], [2760, -85]]);
					}
				}
			}
			color(c = [0.9000000000, 0.6000000000, 0.6000000000]) {
				translate(v = [0, 0, 2176.1000000000]) {
					linear_extrude(height = 100.0000000000) {
						polygon(paths = [[0, 1, 2, 3]], points = [[145, 765], [145, 1615], [445, 1615], [445, 765]]);
					}
				}
			}
			color(c = [0.9000000000, 0.6000000000, 0.6000000000]) {
				translate(v = [0, 0, 2176.1000000000]) {
					linear_extrude(height = 100.0000000000) {
						polygon(paths = [[0, 1, 2, 3]], points = [[1480, 1645], [1480, 1955], [2175, 1955], [2175, 1645]]);
					}
				}
			}
			color(c = [0.9000000000, 0.6000000000, 0.6000000000]) {
				translate(v = [0, 0, 2176.1000000000]) {
					linear_extrude(height = 100.0000000000) {
						polygon(paths = [[0, 1, 2, 3, 4, 5, 6, 7]], points = [[2415, 255], [2415, 775], [2480, 775], [2480, 1580], [2350, 1580], [2350, 2365], [2655, 2365], [2655, 255]]);
					}
				}
			}
			color(c = [0.9000000000, 0.6000000000, 0.6000000000]) {
				translate(v = [0, 0, 2176.1000000000]) {
					linear_extrude(height = 100.0000000000) {
						polygon(paths = [[0, 1, 2, 3, 4, 5, 6, 7, 8, 9, 10, 11, 12, 13, 14, 15]], points = [[1115, 270], [1115, 610], [1320, 610], [1320, 1305], [1020, 1305], [1020, 2420], [1305, 2420], [1305, 1475], [1880, 1475], [1880, 1325], [2305, 1325], [2305, 945], [1490, 945], [1490, 415], [1285, 415], [1285, 270]]);
					}
				}
			}
			color(c = [0.9000000000, 0.6000000000, 0.6000000000]) {
				translate(v = [0, 0, 2176.1000000000]) {
					linear_extrude(height = 100.0000000000) {
						polygon(paths = [[0, 1, 2, 3, 4, 5, 6, 7, 8, 9, 10, 11, 12, 13]], points = [[595, 280], [595, 655], [615, 655], [615, 1785], [175, 1785], [175, 2445], [345, 2445], [345, 2015], [850, 2015], [850, 1135], [1150, 1135], [1150, 805], [835, 805], [835, 280]]);
					}
				}
			}
			color(c = [0.9000000000, 0.6000000000, 0.6000000000]) {
				translate(v = [0, 0, 2176.1000000000]) {
					linear_extrude(height = 100.0000000000) {
						polygon(paths = [[0, 1, 2, 3, 4, 5, 6, 7, 8, 9, 10, 11]], points = [[1485, 2165], [1485, 2635], [845, 2635], [845, 2185], [515, 2185], [515, 2635], [0, 2635], [0, 2805], [2760, 2805], [2760, 2635], [2170, 2635], [2170, 2165]]);
					}
				}
			}
			color(c = [0.5000000000, 0.5000000000, 0.5000000000]) {
				translate(v = [0, 0, 2276.1000000000]) {
					linear_extrude(height = 340.0000000000) {
						polygon(paths = [[0, 1, 2, 3]], points = [[145, -85], [145, 85], [315, 85], [315, -85]]);
					}
				}
			}
			color(c = [0.5000000000, 0.5000000000, 0.5000000000]) {
				translate(v = [0, 0, 2276.1000000000]) {
					linear_extrude(height = 340.0000000000) {
						polygon(paths = [[0, 1, 2, 3]], points = [[605, -85], [605, 85], [775, 85], [775, -85]]);
					}
				}
			}
			color(c = [0.5000000000, 0.5000000000, 0.5000000000]) {
				translate(v = [0, 0, 2276.1000000000]) {
					linear_extrude(height = 340.0000000000) {
						polygon(paths = [[0, 1, 2, 3]], points = [[1065, -85], [1065, 85], [1235, 85], [1235, -85]]);
					}
				}
			}
			color(c = [0.5000000000, 0.5000000000, 0.5000000000]) {
				translate(v = [0, 0, 2276.1000000000]) {
					linear_extrude(height = 340.0000000000) {
						polygon(paths = [[0, 1, 2, 3]], points = [[1525, -85], [1525, 85], [1695, 85], [1695, -85]]);
					}
				}
			}
			color(c = [0.5000000000, 0.5000000000, 0.5000000000]) {
				translate(v = [0, 0, 2276.1000000000]) {
					linear_extrude(height = 340.0000000000) {
						polygon(paths = [[0, 1, 2, 3]], points = [[1985, -85], [1985, 85], [2155, 85], [2155, -85]]);
					}
				}
			}
			color(c = [0.5000000000, 0.5000000000, 0.5000000000]) {
				translate(v = [0, 0, 2276.1000000000]) {
					linear_extrude(height = 340.0000000000) {
						polygon(paths = [[0, 1, 2, 3]], points = [[2445, -85], [2445, 85], [2615, 85], [2615, -85]]);
					}
				}
			}
			color(c = [0.5000000000, 0.5000000000, 0.5000000000]) {
				translate(v = [0, 0, 2276.1000000000]) {
					linear_extrude(height = 340.0000000000) {
						polygon(paths = [[0, 1, 2, 3]], points = [[145, 2635], [145, 2805], [315, 2805], [315, 2635]]);
					}
				}
			}
			color(c = [0.5000000000, 0.5000000000, 0.5000000000]) {
				translate(v = [0, 0, 2276.1000000000]) {
					linear_extrude(height = 340.0000000000) {
						polygon(paths = [[0, 1, 2, 3]], points = [[605, 2635], [605, 2805], [775, 2805], [775, 2635]]);
					}
				}
			}
			color(c = [0.5000000000, 0.5000000000, 0.5000000000]) {
				translate(v = [0, 0, 2276.1000000000]) {
					linear_extrude(height = 340.0000000000) {
						polygon(paths = [[0, 1, 2, 3]], points = [[1065, 2635], [1065, 2805], [1235, 2805], [1235, 2635]]);
					}
				}
			}
			color(c = [0.5000000000, 0.5000000000, 0.5000000000]) {
				translate(v = [0, 0, 2276.1000000000]) {
					linear_extrude(height = 340.0000000000) {
						polygon(paths = [[0, 1, 2, 3]], points = [[1525, 2635], [1525, 2805], [1695, 2805], [1695, 2635]]);
					}
				}
			}
			color(c = [0.5000000000, 0.5000000000, 0.5000000000]) {
				translate(v = [0, 0, 2276.1000000000]) {
					linear_extrude(height = 340.0000000000) {
						polygon(paths = [[0, 1, 2, 3]], points = [[1985, 2635], [1985, 2805], [2155, 2805], [2155, 2635]]);
					}
				}
			}
			color(c = [0.5000000000, 0.5000000000, 0.5000000000]) {
				translate(v = [0, 0, 2276.1000000000]) {
					linear_extrude(height = 340.0000000000) {
						polygon(paths = [[0, 1, 2, 3]], points = [[2445, 2635], [2445, 2805], [2615, 2805], [2615, 2635]]);
					}
				}
			}
			color(c = [0.3000000000, 0.3000000000, 1]) {
				translate(v = [0, 0, 2616.1000000000]) {
					linear_extrude(height = 360.0000000000) {
						polygon(paths = [[0, 1, 2, 3]], points = [[0, -240], [0, 240], [2760, 240], [2760, -240]]);
					}
				}
			}
			color(c = [0.3000000000, 0.3000000000, 1]) {
				translate(v = [0, 0, 2616.1000000000]) {
					linear_extrude(height = 360.0000000000) {
						polygon(paths = [[0, 1, 2, 3]], points = [[0, 2480], [0, 2960], [2760, 2960], [2760, 2480]]);
					}
				}
			}
		}
	}
}
